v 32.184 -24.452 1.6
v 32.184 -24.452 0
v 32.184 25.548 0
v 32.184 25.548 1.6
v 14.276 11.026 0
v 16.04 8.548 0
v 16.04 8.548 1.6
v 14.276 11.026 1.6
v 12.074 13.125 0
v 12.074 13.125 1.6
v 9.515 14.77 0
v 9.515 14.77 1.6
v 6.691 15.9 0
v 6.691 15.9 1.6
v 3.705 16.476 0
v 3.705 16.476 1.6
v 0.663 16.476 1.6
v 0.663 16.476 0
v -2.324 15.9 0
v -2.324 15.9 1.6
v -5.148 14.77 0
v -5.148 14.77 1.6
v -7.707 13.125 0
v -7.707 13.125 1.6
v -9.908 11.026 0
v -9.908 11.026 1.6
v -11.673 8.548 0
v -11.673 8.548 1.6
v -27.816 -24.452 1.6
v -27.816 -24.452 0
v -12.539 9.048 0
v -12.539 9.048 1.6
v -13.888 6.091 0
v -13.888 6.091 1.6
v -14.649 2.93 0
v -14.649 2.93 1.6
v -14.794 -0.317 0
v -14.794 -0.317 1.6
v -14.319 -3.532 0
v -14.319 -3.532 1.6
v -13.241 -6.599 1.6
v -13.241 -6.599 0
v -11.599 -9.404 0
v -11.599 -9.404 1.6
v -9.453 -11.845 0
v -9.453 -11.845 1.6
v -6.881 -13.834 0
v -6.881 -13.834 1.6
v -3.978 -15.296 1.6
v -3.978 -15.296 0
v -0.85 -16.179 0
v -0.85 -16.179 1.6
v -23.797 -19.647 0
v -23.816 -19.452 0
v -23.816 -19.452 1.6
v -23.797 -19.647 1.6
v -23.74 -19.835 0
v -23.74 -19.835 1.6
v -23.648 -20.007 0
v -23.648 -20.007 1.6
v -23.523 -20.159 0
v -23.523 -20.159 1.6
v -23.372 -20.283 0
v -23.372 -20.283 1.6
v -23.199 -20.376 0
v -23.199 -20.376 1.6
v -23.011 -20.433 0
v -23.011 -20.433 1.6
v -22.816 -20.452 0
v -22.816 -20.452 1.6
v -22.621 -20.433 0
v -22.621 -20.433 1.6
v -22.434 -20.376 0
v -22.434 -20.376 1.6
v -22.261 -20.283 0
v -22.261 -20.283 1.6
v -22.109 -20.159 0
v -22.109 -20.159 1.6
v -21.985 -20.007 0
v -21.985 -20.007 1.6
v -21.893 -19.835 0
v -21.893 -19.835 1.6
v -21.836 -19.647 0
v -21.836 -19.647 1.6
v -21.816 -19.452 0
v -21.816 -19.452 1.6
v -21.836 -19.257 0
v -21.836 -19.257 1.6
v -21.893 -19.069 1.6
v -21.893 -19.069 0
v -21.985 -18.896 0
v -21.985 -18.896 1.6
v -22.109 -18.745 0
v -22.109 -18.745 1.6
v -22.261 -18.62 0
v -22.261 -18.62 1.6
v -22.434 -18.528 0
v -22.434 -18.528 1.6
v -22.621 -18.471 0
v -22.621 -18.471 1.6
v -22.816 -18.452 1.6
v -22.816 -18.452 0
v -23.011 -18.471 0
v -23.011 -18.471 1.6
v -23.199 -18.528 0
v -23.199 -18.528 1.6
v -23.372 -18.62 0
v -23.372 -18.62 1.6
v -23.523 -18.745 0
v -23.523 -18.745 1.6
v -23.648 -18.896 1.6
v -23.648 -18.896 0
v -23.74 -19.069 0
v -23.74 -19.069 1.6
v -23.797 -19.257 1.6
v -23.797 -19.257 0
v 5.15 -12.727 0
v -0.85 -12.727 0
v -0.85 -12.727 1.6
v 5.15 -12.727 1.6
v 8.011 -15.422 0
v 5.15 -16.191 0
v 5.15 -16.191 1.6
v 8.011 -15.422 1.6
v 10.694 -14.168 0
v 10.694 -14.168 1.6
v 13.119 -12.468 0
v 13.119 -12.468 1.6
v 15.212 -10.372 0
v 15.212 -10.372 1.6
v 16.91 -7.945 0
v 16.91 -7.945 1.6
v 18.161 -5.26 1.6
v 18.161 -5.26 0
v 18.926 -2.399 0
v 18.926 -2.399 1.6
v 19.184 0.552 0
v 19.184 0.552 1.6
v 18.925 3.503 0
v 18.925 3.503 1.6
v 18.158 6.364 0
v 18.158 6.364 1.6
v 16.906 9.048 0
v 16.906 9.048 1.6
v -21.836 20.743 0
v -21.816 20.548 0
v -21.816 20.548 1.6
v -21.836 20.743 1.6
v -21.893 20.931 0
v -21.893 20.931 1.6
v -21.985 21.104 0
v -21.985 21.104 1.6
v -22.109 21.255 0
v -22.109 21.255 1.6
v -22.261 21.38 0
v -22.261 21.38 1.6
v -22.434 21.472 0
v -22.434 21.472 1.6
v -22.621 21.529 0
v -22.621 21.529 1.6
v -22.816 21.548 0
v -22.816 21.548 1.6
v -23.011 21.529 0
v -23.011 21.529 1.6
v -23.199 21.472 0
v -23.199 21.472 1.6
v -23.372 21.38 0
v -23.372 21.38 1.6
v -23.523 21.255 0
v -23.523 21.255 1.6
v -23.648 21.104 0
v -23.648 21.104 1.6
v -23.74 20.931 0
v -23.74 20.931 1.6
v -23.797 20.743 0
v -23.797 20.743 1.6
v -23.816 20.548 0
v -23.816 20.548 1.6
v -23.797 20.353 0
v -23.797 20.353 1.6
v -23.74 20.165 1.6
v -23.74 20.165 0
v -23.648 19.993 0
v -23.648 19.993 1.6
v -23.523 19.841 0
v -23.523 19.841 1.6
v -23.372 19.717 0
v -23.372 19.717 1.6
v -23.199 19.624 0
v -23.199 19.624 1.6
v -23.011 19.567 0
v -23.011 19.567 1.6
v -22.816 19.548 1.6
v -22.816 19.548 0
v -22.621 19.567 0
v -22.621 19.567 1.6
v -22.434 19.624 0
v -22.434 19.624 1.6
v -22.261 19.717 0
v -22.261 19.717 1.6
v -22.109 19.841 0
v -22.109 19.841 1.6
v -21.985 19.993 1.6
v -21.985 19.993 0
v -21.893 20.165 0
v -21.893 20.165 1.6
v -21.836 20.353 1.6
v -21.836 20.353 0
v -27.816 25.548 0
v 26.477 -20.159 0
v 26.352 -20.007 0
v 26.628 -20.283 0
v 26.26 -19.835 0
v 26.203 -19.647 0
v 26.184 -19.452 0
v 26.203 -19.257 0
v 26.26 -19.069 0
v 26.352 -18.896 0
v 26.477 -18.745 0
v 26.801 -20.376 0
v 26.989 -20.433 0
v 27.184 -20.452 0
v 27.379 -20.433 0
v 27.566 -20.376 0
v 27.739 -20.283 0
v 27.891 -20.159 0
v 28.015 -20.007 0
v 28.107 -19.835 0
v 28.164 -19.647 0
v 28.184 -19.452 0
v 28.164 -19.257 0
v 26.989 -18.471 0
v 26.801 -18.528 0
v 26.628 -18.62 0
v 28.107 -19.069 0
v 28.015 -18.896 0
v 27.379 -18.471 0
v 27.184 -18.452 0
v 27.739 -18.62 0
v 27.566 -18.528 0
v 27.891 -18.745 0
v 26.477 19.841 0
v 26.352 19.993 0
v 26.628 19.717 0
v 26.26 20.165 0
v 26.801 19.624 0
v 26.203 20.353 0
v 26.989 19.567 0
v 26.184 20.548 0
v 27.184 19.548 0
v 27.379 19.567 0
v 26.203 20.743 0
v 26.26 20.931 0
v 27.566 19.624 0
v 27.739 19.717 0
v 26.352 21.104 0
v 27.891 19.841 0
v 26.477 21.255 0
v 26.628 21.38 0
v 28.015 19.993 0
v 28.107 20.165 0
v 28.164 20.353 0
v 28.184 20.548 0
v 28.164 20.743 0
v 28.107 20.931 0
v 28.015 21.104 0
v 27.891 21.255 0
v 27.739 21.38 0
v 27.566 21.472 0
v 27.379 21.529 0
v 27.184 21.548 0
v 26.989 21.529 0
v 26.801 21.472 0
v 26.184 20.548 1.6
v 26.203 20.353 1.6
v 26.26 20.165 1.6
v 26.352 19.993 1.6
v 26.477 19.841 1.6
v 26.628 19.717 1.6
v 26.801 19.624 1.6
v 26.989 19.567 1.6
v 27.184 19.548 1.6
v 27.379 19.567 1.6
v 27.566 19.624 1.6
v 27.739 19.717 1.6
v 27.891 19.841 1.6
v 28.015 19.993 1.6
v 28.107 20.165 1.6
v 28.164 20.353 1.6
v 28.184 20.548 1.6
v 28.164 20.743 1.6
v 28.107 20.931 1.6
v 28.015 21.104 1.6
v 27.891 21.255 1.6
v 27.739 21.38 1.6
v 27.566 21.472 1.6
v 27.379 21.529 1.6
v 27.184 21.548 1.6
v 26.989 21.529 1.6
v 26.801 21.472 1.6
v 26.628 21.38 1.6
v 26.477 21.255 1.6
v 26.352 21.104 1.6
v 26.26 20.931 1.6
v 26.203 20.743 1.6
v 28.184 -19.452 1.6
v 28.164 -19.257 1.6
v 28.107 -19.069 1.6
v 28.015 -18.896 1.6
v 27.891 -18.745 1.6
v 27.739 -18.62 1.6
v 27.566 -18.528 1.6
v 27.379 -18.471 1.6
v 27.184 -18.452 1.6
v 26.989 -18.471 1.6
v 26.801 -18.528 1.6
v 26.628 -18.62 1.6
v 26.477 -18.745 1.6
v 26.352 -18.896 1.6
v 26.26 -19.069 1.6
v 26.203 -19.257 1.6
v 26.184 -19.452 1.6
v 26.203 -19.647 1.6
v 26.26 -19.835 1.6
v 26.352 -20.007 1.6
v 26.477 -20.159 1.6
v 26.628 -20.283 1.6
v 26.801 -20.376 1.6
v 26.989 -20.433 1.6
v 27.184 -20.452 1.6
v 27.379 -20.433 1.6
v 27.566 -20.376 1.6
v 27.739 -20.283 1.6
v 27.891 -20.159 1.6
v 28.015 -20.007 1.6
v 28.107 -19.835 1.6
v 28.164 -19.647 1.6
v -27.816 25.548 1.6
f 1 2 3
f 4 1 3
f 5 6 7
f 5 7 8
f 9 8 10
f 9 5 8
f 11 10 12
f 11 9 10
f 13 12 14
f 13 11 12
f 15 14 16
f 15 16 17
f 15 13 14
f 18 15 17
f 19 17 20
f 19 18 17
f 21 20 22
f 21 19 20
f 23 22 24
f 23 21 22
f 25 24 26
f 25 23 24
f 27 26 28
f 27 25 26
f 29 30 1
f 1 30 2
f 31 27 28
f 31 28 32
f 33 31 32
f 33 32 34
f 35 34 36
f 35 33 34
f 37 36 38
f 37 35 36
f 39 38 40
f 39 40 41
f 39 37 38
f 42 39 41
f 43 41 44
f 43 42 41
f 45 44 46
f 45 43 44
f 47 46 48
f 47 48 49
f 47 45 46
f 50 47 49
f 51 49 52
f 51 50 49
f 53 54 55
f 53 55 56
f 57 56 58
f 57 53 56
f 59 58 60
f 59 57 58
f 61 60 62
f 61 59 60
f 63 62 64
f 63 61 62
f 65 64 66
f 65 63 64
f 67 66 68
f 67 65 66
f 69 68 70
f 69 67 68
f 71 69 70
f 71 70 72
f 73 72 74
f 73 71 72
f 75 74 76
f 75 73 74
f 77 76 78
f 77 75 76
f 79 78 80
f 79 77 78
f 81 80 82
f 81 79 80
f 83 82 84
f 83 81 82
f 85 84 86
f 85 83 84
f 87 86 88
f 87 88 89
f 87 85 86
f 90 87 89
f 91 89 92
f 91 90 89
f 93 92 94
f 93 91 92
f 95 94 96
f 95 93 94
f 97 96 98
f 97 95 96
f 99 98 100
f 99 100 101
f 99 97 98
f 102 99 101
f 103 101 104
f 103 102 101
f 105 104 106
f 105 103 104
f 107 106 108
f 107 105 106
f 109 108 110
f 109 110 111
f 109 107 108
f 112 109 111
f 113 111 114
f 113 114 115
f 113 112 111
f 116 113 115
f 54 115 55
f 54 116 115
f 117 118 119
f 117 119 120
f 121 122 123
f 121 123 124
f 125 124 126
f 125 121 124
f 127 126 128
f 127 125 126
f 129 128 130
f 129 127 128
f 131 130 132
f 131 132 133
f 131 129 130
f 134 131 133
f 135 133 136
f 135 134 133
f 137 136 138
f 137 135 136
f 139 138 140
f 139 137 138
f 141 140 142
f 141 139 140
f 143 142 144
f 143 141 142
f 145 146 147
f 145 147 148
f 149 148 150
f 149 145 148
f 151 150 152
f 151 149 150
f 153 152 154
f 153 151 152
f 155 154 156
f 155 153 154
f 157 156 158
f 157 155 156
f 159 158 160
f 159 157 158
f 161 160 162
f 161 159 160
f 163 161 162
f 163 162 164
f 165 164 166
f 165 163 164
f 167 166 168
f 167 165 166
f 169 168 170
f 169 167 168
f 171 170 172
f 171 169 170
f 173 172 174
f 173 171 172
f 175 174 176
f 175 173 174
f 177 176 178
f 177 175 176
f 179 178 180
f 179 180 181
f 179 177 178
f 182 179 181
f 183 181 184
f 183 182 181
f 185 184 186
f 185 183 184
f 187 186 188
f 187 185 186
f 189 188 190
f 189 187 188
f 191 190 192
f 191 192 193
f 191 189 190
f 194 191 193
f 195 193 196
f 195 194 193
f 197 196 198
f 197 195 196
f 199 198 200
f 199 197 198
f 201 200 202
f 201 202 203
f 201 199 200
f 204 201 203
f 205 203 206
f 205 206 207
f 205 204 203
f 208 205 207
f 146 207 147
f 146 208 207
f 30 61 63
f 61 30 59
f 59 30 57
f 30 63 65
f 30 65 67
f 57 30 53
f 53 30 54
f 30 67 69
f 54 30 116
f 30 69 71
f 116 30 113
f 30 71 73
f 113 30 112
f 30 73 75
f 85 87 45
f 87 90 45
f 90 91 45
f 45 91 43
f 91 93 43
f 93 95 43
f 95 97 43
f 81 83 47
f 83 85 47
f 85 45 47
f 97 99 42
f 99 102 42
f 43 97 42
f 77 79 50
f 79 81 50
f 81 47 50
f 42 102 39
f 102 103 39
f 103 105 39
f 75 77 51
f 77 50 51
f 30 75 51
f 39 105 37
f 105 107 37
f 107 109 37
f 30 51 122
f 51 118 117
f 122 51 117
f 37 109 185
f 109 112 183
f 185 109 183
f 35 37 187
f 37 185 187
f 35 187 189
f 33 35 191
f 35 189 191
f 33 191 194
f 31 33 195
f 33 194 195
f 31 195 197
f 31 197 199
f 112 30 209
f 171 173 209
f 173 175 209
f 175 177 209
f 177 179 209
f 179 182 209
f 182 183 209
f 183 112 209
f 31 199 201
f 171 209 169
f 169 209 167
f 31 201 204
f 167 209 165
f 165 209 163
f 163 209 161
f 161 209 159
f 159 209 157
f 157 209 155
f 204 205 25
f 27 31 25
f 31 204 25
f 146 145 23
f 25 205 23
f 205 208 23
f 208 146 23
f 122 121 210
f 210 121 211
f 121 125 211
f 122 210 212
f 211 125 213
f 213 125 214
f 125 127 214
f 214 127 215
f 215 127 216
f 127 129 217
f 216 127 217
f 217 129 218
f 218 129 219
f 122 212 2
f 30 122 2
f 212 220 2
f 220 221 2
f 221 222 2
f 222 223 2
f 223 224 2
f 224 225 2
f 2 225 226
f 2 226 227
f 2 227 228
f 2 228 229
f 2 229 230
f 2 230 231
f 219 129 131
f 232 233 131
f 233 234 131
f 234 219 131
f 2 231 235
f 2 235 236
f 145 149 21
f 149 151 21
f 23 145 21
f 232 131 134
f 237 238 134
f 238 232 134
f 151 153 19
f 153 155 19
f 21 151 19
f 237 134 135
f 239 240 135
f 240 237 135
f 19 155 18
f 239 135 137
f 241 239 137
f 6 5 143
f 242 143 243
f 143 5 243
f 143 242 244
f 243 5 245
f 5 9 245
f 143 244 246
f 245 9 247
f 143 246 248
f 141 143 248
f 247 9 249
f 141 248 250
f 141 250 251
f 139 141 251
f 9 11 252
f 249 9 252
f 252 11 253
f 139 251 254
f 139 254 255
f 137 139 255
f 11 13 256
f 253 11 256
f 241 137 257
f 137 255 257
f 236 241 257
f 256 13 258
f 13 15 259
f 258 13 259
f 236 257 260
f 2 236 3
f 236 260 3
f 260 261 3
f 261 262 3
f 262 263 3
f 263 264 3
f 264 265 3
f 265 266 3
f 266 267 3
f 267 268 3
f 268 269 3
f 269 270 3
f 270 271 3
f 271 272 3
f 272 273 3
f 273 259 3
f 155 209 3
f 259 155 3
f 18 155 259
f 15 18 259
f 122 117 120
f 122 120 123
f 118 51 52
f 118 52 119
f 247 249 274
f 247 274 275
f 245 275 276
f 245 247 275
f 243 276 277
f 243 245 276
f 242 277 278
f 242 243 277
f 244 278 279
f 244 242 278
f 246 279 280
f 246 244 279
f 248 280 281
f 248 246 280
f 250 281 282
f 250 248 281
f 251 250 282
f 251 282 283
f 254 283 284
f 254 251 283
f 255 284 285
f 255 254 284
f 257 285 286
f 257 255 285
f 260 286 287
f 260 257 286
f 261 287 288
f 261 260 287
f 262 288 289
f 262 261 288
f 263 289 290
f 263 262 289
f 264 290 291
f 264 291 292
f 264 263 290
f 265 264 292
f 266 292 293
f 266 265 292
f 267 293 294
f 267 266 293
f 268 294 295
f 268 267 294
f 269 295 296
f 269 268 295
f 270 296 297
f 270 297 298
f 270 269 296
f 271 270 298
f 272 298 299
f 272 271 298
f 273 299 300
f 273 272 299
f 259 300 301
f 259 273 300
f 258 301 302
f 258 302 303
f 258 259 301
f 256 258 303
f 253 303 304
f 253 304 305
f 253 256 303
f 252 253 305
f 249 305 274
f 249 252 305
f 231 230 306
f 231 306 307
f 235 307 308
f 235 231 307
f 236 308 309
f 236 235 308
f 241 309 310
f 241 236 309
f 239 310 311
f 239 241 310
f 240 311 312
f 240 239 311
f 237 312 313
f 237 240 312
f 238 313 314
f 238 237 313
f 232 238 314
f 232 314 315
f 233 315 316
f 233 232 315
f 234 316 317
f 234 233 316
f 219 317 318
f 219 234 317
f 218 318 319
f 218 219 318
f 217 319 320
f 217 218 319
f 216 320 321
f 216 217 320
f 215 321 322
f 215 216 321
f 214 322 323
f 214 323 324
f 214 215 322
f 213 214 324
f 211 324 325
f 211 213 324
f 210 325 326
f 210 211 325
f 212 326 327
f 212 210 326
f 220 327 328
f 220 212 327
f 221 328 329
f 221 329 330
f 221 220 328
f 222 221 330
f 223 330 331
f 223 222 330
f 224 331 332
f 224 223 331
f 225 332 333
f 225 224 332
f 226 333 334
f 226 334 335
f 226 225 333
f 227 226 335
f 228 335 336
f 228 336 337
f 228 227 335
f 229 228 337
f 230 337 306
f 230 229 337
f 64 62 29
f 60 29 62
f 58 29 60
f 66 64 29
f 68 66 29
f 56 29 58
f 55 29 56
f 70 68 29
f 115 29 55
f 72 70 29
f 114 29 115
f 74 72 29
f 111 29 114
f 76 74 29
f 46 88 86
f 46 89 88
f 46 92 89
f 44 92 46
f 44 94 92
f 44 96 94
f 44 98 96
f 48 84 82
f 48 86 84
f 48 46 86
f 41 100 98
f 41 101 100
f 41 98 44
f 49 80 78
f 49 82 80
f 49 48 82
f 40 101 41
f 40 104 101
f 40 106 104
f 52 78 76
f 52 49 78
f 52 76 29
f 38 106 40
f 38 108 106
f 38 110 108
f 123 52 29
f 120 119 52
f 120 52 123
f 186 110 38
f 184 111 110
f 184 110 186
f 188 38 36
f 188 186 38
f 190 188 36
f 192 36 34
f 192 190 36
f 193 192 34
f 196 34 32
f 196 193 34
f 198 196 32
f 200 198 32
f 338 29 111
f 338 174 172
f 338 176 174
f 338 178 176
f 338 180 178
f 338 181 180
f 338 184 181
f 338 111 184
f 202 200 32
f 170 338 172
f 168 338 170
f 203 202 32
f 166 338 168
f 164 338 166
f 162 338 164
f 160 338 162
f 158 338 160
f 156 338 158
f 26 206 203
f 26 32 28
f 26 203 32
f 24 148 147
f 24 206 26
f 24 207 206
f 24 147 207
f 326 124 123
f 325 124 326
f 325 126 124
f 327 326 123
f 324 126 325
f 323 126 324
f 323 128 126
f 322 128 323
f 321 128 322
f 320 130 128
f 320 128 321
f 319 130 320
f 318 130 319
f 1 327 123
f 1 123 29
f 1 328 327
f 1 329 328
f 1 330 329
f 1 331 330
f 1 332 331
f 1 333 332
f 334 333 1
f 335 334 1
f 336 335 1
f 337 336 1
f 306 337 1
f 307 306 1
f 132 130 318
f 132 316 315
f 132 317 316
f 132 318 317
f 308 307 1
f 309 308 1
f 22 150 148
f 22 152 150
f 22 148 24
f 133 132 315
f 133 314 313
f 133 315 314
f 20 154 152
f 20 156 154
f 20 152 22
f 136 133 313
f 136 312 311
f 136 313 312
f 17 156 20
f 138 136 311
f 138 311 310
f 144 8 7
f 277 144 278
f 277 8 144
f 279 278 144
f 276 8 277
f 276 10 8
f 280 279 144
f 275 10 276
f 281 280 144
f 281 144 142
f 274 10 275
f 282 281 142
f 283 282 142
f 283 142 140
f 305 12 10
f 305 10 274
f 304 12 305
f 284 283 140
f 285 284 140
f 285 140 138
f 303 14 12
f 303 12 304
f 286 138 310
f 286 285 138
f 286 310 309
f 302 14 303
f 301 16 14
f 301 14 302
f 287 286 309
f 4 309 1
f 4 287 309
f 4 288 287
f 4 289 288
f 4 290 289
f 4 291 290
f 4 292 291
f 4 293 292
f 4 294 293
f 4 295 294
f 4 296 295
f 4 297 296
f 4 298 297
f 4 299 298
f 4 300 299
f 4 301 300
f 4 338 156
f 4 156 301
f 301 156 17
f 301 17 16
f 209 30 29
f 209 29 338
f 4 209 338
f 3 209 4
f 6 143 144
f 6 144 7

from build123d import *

# Parameters (mm, degrees)
SKETCH1_W           = 60
SKETCH1_H           = 50
SKETCH1_R           = 1
BOSS_EXTRUDE1_DEPTH = 1.6


with BuildPart() as part:
    # Sketch1 → Boss-Extrude1 (new body)
    with BuildSketch(Plane.XY):
        with Locations((2.183616654, 0.548157273)):
            Rectangle(SKETCH1_W, SKETCH1_H)
        with Locations((-22.816383346, 20.548157273)):
            Circle(SKETCH1_R, mode=Mode.SUBTRACT)
        with Locations(Location((27.183616654, 20.548157273, 0), (0, 0, 180))):
            Circle(SKETCH1_R, mode=Mode.SUBTRACT)
        with Locations((27.183616654, -19.451842727)):
            Circle(SKETCH1_R, mode=Mode.SUBTRACT)
        with Locations(Location((-22.816383346, -19.451842727, 0), (0, 0, 180))):
            Circle(SKETCH1_R, mode=Mode.SUBTRACT)
        with BuildLine():
            Line((-0.849639296, -12.726842727), (5.150360704, -12.726842727))
            Line((5.150360704, -12.726842727), (5.150360704, -16.19097143))
            ThreePointArc((5.150360704, -16.19097143), (17.594007322, -6.629576314), (16.906048518, 9.048157273))
            Line((16.906048518, 9.048157273), (16.040023114, 8.548157273))
            ThreePointArc((16.040023114, 8.548157273), (2.183616654, 16.548157273), (-11.672789807, 8.548157273))
            Line((-11.672789807, 8.548157273), (-12.538815211, 9.048157273))
            ThreePointArc((-12.538815211, 9.048157273), (-13.241008775, -6.598935169), (-0.849639296, -16.179046867))
            Line((-0.849639296, -16.179046867), (-0.849639296, -12.726842727))
        make_face(mode=Mode.SUBTRACT)
    extrude(amount=BOSS_EXTRUDE1_DEPTH)


solid = part.part
